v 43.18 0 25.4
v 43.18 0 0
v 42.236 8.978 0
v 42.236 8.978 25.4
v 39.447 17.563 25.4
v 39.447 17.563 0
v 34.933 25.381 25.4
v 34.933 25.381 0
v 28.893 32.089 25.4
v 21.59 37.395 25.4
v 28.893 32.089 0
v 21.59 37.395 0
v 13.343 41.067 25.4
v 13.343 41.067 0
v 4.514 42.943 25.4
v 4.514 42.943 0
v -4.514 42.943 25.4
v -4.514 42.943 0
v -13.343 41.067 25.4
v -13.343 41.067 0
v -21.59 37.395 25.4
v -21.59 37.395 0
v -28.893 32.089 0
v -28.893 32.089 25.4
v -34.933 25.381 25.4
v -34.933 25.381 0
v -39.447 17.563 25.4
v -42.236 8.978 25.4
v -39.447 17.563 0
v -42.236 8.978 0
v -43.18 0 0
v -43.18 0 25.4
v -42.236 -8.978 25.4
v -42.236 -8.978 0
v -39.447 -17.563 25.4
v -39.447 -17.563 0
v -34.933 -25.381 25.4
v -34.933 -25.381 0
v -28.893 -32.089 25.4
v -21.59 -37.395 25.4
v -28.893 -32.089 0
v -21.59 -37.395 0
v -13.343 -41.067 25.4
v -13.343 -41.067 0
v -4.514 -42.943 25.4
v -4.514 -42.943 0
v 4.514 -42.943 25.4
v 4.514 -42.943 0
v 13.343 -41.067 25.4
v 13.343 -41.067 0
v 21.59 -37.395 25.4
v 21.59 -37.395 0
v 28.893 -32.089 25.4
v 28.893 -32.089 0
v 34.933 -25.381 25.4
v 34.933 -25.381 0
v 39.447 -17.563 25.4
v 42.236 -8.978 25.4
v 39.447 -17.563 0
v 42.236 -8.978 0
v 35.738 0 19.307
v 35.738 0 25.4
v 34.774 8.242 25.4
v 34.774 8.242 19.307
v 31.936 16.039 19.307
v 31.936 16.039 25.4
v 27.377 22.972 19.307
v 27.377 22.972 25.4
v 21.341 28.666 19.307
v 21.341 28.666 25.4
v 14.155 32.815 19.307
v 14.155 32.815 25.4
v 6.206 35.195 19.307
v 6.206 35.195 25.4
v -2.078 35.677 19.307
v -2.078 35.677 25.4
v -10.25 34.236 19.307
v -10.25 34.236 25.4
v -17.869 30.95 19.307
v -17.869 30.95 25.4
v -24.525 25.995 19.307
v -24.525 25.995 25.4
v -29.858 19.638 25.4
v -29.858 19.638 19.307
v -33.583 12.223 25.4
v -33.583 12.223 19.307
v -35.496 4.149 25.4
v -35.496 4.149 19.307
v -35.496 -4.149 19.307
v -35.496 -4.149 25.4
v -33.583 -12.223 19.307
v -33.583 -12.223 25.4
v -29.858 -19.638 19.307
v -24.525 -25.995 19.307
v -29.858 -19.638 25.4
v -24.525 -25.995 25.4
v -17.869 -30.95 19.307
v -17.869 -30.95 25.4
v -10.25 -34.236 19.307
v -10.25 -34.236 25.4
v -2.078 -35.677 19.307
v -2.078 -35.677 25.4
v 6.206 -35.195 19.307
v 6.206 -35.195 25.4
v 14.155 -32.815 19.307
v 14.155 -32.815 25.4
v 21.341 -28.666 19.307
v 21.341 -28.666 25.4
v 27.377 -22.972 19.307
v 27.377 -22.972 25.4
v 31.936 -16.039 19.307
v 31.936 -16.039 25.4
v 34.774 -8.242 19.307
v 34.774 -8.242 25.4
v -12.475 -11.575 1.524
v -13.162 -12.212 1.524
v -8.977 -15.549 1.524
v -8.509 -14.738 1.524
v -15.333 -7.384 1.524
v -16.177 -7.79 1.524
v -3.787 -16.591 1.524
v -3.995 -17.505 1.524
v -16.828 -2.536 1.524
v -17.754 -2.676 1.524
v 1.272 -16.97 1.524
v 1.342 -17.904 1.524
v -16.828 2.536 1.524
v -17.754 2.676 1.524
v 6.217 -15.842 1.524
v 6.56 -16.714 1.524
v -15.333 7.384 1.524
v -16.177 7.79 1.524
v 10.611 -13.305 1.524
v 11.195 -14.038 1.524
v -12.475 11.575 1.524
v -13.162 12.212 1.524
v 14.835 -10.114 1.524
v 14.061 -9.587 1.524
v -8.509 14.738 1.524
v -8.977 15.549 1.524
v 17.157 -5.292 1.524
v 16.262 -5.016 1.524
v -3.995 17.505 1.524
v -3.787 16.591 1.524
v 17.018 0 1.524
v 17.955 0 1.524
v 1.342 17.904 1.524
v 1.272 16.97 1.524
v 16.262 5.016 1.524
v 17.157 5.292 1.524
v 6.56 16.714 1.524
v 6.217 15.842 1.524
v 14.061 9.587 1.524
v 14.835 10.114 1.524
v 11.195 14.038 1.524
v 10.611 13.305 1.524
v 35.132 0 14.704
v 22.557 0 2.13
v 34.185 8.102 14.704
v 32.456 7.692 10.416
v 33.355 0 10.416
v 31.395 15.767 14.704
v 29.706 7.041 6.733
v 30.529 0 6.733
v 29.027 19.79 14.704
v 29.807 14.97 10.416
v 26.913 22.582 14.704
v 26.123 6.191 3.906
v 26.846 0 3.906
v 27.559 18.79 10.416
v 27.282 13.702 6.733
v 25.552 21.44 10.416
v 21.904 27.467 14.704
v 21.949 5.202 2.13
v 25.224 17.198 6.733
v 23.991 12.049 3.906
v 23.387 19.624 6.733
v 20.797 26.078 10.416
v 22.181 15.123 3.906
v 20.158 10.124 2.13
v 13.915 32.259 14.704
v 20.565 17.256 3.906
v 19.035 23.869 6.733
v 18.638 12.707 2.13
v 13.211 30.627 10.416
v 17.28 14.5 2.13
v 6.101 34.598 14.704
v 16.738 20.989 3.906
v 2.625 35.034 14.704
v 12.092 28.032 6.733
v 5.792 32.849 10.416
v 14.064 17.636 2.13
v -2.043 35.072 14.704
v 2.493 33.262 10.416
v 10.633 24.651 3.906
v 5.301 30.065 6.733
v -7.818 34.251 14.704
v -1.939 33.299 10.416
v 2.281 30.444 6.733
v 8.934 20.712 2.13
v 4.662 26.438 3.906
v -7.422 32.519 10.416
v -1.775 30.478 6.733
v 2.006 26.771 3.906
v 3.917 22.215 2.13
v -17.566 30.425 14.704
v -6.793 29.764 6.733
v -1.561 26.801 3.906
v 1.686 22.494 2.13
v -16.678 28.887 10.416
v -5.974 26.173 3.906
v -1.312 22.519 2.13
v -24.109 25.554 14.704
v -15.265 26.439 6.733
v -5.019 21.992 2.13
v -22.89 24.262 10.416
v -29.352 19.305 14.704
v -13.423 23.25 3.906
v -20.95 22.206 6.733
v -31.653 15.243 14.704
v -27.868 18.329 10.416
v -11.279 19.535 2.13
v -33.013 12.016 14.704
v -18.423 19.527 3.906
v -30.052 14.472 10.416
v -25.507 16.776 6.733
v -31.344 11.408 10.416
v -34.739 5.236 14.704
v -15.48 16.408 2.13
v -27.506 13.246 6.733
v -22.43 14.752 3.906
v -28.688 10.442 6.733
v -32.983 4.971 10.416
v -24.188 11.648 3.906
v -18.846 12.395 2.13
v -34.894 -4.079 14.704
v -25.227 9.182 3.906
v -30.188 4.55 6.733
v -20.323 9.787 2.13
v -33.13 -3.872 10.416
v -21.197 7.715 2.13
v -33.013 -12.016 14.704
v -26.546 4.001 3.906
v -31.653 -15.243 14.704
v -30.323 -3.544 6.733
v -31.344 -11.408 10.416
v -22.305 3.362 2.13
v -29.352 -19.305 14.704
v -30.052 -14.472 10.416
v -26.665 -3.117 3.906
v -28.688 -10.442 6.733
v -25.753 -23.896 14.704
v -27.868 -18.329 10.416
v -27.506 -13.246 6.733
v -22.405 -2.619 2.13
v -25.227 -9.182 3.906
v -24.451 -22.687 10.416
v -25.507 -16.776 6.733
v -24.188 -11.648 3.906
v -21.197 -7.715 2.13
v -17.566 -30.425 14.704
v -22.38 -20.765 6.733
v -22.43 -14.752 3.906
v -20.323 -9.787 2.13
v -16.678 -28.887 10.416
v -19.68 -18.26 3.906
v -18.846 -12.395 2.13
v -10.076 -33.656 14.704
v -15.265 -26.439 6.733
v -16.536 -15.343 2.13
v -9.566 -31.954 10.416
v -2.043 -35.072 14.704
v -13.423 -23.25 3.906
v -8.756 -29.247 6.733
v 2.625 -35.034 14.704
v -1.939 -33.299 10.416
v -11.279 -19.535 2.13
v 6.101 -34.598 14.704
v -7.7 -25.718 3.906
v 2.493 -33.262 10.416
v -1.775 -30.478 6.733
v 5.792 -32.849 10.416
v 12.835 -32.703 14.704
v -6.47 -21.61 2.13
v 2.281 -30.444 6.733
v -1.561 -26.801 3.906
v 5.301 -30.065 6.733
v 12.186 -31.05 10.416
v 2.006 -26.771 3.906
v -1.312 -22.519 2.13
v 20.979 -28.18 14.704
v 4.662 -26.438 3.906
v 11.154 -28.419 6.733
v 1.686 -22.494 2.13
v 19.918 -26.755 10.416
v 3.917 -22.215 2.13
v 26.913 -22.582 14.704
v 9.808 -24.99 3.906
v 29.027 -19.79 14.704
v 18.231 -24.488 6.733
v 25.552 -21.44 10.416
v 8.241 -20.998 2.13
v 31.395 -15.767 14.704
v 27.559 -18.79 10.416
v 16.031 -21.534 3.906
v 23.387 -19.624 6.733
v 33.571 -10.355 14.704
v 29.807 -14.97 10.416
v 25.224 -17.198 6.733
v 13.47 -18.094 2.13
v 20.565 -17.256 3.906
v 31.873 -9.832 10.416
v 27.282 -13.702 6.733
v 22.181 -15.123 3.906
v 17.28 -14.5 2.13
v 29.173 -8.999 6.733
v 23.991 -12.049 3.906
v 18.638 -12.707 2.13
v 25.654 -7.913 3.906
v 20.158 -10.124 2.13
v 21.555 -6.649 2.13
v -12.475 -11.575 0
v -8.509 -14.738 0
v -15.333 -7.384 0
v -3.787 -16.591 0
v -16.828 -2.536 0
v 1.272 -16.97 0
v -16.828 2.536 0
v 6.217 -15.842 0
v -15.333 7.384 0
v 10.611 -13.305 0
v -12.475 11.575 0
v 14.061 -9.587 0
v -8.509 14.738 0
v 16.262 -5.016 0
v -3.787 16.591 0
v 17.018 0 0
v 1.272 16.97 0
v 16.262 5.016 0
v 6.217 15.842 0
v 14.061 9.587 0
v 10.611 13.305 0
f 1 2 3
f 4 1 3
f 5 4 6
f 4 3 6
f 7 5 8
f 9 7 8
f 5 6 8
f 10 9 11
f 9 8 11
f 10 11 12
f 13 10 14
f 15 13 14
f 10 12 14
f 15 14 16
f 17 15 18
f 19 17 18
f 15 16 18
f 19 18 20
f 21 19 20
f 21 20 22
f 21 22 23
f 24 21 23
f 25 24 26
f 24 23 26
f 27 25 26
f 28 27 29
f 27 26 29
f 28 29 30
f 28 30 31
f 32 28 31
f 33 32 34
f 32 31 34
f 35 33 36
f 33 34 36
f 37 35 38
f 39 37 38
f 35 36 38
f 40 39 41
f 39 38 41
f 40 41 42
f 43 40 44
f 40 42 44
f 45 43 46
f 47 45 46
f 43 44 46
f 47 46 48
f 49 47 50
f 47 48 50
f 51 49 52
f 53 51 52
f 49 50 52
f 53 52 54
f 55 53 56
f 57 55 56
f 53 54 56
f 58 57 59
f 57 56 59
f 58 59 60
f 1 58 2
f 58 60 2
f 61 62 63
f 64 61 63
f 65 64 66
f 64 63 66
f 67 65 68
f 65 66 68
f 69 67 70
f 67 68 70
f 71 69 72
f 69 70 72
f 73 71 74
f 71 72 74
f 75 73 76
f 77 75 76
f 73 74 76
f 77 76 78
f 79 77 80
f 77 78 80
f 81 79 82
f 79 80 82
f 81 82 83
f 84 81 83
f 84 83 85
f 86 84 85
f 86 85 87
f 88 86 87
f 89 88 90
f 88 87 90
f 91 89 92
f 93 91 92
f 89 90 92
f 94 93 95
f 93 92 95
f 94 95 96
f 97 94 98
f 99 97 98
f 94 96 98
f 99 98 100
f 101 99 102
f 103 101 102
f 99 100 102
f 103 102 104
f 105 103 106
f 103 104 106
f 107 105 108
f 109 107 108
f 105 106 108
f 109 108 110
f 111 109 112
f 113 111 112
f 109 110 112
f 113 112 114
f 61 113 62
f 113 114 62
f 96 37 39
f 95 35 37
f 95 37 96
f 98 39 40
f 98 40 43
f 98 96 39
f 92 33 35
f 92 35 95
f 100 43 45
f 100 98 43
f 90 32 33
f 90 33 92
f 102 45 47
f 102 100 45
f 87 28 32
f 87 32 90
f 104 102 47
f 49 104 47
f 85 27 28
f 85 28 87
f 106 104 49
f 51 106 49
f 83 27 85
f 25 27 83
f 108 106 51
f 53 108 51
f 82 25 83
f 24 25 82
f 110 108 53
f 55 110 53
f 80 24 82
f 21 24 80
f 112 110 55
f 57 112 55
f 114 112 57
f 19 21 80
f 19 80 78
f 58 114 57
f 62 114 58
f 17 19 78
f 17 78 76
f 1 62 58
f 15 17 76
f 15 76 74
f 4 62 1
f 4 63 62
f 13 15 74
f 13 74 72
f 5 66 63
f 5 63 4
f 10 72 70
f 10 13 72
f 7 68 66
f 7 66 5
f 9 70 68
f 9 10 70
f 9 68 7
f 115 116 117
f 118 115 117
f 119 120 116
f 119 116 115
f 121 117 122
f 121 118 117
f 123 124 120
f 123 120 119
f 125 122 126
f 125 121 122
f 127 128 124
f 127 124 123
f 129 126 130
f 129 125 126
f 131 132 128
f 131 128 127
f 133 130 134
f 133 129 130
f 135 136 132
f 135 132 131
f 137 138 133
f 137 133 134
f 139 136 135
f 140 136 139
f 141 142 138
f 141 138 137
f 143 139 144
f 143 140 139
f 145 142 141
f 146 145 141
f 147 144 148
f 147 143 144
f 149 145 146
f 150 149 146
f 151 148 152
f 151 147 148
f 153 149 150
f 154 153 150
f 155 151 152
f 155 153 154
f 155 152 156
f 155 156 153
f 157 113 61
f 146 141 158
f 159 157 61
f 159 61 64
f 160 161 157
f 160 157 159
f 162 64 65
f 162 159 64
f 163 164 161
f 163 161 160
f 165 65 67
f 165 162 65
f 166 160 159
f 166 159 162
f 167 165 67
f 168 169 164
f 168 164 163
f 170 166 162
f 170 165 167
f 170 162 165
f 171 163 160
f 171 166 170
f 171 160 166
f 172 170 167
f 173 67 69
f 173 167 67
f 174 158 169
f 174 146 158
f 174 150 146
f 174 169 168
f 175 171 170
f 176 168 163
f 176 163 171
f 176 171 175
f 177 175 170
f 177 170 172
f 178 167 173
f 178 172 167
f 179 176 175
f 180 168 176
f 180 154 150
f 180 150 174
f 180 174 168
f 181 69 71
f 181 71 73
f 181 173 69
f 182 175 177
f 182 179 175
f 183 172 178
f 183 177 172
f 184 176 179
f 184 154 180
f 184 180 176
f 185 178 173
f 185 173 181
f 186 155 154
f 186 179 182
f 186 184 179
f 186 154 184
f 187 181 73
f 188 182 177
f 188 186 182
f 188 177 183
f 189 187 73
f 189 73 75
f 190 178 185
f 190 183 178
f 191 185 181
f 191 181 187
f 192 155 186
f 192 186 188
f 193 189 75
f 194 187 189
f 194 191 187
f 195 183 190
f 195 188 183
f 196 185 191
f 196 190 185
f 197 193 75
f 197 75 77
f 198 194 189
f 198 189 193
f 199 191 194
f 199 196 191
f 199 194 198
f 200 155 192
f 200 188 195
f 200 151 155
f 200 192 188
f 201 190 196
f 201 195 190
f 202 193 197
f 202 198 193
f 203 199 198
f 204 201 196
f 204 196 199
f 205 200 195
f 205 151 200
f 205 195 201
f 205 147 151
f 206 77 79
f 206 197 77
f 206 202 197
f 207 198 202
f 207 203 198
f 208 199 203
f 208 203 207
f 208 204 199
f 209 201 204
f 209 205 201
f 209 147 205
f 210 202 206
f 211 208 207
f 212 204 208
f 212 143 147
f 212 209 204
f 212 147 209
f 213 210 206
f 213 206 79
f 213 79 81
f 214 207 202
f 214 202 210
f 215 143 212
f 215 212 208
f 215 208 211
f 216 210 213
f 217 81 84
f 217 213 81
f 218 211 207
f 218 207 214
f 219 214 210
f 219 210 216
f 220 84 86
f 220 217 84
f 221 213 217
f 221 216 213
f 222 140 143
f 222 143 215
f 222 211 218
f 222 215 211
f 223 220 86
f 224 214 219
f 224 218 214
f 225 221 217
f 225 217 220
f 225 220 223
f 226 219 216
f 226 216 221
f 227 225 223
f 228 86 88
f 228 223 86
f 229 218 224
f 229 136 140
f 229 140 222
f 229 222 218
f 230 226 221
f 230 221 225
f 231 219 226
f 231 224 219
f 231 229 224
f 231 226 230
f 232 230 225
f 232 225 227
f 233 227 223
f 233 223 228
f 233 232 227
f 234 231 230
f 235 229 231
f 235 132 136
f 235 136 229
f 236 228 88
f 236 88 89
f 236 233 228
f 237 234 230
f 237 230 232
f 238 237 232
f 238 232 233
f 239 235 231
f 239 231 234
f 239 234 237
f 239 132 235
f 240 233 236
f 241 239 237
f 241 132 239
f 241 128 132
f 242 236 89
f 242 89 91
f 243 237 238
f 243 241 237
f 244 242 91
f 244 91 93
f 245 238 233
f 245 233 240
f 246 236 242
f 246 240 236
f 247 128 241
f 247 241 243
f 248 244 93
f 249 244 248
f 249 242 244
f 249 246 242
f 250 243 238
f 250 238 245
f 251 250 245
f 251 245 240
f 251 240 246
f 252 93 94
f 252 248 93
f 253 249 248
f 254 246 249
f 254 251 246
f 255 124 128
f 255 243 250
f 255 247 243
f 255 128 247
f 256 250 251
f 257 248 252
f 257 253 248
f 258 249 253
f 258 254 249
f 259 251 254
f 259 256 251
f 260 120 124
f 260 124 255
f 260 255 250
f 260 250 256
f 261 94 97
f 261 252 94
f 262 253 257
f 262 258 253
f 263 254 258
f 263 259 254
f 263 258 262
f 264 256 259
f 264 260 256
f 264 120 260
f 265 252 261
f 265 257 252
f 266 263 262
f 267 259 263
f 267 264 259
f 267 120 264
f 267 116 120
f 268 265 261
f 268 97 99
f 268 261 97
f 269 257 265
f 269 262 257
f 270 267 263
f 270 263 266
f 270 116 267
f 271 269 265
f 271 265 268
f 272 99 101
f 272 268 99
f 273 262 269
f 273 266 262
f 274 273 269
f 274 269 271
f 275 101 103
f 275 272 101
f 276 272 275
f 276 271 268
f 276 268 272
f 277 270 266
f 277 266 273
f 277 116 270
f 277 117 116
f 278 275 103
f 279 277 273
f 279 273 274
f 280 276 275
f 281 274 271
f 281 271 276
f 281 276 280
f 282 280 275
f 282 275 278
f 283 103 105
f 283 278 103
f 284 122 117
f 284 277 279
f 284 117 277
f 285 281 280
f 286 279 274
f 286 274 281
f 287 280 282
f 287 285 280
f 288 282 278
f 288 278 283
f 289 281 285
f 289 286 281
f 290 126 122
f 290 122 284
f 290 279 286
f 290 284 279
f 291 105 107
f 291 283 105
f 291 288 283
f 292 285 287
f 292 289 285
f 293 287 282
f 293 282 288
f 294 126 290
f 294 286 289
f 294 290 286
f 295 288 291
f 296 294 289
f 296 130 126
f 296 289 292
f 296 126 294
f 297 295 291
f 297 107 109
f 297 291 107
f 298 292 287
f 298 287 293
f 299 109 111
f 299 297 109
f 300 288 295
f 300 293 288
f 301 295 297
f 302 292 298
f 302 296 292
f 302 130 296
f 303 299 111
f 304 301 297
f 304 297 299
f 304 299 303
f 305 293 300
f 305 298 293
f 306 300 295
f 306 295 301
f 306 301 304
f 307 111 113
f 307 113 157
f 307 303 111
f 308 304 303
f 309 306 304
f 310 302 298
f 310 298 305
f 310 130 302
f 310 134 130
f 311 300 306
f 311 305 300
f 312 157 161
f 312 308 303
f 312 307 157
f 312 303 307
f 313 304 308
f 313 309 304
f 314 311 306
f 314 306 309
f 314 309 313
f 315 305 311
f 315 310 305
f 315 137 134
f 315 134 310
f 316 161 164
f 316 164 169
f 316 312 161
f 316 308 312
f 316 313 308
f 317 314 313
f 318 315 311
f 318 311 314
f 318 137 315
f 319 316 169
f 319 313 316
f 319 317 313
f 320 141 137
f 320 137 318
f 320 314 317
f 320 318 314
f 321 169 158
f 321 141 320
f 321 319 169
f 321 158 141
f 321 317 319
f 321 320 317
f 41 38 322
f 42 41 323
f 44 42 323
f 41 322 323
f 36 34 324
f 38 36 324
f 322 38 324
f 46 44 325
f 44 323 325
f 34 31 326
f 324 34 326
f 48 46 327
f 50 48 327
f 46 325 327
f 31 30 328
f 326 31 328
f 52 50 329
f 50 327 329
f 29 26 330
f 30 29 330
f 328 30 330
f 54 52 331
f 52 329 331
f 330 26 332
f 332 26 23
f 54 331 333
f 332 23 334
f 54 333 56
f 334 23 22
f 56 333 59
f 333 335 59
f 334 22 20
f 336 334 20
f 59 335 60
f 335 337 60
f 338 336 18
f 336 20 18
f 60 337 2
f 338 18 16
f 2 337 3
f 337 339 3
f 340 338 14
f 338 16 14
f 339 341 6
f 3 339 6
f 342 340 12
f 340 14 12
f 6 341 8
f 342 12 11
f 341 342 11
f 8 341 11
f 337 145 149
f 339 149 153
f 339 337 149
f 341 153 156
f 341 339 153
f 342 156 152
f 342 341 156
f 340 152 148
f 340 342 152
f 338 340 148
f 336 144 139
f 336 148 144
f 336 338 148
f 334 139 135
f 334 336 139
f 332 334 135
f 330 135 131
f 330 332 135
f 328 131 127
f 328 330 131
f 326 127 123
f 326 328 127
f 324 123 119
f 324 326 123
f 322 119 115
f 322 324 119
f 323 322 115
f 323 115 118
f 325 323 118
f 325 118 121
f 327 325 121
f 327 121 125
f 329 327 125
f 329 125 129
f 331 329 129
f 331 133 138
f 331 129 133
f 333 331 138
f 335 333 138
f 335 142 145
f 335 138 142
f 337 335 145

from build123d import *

# Parameters (mm, degrees)
F0_R     = 43.18
F1_DEPTH = 25.4
F2_R     = 17.018
F3_DEPTH = 27.686
F4_R     = 35.7378
F5_DEPTH = 23.876
F6_R     = 17.783097


with BuildPart() as f1:
    # F0 (on Top) → F1 (new body)
    with BuildSketch(Plane.XY):
        Circle(F0_R)
    extrude(amount=F1_DEPTH)

    # F2 (on face) → F3 (cut)
    with BuildSketch(Plane.XY):
        Circle(F2_R)
    extrude(amount=F3_DEPTH, mode=Mode.SUBTRACT)

    # F4 (on face) → F5 (cut)
    with BuildSketch(Plane.XY.offset(25.4)):
        Circle(F4_R)
    extrude(amount=-F5_DEPTH, mode=Mode.SUBTRACT)

    # F6
    f6_edges = [f1.edges().sort_by_distance(p)[0] for p in [
        (-35.7378, 0, 1.524),
    ]]
    fillet(f6_edges, radius=F6_R)


solid = f1.part
